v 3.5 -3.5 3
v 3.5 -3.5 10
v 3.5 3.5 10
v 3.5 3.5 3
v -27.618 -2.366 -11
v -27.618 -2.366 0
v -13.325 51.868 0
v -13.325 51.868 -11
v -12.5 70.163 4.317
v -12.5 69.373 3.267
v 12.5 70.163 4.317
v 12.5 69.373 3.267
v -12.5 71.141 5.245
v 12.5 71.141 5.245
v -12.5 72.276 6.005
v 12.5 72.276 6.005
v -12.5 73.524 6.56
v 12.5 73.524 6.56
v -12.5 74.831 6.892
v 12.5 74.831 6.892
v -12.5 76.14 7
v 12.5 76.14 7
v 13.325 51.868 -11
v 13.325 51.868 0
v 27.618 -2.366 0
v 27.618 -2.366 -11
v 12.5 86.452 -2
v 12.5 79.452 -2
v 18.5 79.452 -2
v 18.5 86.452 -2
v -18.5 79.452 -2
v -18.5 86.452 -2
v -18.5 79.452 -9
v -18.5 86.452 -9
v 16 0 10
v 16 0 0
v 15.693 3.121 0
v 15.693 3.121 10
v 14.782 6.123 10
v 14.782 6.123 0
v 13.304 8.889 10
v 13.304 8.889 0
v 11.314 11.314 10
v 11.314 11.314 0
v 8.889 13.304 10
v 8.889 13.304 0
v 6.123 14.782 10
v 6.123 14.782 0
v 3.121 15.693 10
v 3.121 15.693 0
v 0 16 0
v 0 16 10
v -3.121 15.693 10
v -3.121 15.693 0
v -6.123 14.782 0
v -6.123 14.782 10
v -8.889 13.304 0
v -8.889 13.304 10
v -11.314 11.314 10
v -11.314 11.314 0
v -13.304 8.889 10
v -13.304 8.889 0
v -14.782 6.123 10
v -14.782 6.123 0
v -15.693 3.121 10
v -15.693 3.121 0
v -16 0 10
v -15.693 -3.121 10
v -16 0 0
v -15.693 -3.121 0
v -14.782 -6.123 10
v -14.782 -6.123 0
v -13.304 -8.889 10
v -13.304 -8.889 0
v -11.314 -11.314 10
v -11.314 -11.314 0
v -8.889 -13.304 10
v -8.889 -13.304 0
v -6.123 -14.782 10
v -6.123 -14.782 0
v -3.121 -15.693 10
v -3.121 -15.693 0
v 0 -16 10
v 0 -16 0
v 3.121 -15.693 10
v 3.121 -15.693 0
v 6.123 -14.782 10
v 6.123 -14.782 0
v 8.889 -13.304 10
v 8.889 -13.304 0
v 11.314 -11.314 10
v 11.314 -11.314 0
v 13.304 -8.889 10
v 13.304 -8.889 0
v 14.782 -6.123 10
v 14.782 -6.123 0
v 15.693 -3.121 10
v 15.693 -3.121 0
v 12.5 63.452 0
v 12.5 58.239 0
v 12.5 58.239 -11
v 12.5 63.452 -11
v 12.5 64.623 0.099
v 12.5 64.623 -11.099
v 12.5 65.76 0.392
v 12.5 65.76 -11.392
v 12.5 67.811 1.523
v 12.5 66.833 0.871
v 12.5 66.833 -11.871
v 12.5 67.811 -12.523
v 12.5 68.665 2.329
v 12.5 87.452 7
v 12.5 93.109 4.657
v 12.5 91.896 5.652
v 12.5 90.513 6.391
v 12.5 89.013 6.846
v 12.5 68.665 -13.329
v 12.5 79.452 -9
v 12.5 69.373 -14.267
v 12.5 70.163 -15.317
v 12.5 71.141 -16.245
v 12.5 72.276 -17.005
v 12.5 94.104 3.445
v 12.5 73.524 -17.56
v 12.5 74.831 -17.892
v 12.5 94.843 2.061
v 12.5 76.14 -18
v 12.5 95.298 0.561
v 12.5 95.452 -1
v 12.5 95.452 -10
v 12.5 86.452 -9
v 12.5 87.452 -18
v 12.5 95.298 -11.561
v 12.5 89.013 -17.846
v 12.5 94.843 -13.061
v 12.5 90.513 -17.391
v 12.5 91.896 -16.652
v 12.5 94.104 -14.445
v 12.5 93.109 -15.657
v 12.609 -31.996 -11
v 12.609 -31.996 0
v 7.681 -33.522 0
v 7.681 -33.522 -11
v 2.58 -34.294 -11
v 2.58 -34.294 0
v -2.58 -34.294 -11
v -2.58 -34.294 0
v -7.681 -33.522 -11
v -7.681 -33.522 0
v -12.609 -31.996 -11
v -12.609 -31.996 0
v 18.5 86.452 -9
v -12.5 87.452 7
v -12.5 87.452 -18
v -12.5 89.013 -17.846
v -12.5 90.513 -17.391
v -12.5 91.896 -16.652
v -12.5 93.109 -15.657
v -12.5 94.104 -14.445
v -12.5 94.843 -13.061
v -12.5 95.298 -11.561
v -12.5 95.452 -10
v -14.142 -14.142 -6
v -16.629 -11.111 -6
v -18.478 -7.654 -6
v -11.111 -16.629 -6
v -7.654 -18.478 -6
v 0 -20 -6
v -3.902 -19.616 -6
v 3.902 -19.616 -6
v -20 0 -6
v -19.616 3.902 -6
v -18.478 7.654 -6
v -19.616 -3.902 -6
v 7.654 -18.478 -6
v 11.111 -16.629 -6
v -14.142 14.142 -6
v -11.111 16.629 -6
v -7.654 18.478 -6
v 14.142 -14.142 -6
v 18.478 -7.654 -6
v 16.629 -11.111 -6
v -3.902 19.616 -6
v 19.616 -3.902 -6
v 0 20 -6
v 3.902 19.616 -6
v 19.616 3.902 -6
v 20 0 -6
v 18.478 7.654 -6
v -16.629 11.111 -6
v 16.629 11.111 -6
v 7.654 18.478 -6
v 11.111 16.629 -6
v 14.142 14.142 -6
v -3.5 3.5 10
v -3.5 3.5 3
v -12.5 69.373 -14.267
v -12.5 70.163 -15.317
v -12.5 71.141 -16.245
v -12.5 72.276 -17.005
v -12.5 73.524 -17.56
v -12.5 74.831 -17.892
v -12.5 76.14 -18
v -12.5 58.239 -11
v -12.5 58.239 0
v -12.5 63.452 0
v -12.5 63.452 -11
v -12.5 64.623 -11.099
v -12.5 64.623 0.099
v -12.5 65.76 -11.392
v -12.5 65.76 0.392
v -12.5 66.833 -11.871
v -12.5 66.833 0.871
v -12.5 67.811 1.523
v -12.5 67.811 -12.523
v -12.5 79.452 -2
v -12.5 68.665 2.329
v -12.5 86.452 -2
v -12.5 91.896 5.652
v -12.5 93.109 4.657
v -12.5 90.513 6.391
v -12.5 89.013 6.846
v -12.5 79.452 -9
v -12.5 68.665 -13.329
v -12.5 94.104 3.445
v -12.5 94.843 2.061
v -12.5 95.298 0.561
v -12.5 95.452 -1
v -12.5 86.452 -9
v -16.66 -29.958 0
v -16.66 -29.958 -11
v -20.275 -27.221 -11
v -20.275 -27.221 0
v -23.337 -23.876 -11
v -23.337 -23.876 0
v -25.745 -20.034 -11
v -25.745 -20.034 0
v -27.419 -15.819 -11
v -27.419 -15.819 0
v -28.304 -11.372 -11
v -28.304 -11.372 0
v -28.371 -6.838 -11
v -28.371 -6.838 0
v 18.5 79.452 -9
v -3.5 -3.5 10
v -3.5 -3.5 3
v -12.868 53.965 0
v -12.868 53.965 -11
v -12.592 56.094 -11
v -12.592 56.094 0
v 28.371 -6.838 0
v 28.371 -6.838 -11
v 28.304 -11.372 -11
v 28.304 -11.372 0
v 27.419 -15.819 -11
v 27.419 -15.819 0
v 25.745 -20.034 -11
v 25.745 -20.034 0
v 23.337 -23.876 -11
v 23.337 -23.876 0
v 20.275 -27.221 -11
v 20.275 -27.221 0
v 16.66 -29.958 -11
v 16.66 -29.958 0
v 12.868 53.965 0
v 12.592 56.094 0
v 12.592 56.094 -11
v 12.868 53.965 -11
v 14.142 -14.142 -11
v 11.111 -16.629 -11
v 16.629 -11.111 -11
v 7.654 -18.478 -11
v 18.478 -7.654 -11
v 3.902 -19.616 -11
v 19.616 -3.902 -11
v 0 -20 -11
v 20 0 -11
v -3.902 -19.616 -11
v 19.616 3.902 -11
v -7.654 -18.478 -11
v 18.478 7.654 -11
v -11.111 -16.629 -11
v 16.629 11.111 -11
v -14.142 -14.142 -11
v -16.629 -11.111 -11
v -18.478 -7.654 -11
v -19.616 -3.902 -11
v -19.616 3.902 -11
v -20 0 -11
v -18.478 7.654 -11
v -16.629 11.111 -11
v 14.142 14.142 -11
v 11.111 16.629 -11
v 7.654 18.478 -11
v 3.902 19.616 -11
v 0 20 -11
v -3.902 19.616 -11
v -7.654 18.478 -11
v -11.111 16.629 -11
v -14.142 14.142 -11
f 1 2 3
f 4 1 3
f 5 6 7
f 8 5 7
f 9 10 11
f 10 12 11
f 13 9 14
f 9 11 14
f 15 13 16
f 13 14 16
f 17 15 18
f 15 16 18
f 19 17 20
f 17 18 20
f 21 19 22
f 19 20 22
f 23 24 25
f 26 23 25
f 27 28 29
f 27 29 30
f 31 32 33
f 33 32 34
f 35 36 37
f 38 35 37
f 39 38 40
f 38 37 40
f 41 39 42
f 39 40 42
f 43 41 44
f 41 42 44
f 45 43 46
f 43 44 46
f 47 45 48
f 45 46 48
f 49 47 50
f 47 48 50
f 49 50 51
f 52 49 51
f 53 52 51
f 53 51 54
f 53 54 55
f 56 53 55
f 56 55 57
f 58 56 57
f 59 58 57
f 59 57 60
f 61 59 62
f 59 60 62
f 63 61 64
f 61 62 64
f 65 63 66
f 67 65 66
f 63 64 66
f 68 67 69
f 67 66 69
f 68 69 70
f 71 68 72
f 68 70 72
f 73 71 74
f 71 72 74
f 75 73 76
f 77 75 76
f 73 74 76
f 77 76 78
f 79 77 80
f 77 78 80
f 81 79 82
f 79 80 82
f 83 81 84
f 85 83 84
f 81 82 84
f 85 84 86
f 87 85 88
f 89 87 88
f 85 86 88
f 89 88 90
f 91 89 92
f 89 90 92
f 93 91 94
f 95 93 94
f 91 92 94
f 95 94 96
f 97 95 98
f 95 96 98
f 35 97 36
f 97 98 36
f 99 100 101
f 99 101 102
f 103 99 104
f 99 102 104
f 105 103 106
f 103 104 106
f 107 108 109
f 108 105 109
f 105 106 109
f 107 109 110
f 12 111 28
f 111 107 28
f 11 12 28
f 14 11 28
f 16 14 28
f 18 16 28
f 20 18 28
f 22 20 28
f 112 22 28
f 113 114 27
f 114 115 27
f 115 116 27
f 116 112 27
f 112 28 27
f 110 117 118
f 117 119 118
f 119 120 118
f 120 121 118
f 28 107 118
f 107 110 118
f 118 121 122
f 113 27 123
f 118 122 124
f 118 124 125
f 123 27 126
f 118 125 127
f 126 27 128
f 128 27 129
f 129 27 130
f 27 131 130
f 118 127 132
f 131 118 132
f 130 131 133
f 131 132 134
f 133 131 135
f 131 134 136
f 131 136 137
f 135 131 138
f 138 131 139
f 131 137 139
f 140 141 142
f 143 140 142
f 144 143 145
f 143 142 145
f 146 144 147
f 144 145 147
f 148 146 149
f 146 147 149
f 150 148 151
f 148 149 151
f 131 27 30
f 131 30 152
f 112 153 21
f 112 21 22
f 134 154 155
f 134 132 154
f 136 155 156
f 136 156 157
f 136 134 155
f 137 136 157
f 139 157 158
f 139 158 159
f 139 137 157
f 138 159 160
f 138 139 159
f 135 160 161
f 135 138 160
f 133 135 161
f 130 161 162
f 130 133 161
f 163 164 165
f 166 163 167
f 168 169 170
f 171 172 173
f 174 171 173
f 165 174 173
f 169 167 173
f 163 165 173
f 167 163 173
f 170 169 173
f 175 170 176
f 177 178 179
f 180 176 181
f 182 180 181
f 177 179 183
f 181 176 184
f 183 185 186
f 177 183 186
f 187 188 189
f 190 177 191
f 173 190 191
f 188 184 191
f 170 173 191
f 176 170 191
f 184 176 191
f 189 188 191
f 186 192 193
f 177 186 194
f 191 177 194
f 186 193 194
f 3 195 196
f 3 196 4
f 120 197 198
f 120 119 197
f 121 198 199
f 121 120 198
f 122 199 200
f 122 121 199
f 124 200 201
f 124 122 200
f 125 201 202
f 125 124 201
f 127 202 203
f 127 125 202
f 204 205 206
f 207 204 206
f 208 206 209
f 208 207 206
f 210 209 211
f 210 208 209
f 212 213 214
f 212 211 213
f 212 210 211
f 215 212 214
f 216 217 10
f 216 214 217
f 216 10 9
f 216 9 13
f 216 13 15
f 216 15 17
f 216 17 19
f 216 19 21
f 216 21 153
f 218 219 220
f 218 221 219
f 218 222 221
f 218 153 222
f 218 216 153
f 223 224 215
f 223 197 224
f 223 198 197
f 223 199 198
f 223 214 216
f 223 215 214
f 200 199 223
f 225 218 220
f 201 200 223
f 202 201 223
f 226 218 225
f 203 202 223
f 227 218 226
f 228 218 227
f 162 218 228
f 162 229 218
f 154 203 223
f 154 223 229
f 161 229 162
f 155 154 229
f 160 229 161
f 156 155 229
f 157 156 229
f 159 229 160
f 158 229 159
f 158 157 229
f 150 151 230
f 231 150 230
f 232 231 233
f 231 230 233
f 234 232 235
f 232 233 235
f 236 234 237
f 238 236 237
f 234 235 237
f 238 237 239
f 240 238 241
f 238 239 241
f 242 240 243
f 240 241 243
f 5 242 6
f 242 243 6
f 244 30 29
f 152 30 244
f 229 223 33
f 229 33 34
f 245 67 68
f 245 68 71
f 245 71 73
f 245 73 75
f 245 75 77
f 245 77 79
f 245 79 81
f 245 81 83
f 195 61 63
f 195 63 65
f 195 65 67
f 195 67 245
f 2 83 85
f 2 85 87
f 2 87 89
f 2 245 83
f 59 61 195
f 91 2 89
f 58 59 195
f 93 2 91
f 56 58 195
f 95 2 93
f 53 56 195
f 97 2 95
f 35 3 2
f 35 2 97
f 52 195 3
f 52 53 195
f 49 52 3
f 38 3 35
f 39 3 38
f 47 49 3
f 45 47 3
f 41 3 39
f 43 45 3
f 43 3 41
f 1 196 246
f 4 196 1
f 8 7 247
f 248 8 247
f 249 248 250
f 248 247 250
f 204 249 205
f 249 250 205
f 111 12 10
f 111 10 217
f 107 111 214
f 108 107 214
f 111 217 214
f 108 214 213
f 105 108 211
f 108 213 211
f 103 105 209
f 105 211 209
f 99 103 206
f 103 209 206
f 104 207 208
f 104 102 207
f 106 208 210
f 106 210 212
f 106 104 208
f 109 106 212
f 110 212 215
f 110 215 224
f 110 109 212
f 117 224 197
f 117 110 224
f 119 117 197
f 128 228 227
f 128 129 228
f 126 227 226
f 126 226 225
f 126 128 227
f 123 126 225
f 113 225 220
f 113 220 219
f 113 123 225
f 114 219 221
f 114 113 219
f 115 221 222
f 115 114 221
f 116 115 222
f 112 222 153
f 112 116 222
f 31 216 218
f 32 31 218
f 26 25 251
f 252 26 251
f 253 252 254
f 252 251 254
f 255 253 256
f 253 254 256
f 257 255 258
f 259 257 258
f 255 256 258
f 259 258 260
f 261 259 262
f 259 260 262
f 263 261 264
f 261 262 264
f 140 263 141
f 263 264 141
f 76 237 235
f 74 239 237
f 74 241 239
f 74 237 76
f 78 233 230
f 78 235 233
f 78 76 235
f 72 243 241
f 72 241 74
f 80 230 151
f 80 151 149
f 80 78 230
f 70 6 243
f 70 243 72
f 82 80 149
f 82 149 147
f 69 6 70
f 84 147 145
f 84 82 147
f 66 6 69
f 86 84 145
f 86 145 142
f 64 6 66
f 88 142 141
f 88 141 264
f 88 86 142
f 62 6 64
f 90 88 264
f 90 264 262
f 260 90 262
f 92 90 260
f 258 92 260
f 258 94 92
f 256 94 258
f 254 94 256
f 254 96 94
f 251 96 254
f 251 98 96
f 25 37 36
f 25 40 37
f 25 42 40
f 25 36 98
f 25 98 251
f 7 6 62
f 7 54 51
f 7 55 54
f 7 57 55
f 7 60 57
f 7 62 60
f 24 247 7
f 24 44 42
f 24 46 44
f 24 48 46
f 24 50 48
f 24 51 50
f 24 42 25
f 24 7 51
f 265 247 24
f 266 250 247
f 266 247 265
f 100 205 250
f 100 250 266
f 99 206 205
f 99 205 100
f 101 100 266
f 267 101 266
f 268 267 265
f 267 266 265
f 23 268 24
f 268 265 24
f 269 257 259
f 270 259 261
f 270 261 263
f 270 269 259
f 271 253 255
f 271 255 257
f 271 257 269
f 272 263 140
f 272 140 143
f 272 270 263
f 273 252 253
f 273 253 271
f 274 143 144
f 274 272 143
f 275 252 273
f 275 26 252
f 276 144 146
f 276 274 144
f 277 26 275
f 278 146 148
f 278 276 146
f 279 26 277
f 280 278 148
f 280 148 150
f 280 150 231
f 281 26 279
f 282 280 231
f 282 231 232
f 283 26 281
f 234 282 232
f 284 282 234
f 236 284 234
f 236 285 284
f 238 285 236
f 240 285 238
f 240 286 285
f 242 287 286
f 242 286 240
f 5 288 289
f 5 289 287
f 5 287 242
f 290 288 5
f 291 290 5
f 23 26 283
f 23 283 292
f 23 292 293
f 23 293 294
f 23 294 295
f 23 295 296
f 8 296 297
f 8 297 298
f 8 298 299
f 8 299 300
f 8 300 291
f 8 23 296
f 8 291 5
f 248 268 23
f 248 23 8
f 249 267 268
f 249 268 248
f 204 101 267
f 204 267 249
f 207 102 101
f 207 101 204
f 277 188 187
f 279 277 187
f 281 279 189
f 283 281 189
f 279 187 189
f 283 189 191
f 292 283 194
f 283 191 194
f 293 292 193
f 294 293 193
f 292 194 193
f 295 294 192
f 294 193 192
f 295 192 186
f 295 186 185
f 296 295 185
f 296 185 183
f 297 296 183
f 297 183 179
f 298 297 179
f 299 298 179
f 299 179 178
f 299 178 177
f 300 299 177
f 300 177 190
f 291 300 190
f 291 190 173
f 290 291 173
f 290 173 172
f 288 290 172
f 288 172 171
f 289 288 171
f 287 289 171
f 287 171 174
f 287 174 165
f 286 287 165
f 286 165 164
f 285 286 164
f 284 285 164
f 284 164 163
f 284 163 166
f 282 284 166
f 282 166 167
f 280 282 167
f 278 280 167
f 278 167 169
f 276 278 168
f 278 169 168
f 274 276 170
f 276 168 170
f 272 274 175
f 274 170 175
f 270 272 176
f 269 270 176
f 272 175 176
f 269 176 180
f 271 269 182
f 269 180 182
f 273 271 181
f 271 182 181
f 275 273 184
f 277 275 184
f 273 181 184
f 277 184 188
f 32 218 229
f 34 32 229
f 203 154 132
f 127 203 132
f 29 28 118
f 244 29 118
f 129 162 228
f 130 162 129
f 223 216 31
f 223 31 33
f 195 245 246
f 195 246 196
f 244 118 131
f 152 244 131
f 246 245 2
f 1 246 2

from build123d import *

# Parameters (mm, degrees)
SKETCH1_R                = 20
SKETCH1_R_2              = 4
BOSS_EXTRUDE1_DEPTH      = 11
SKETCH1_4_R              = 20
BOSS_EXTRUDE2_DEPTH      = 6
SKETCH3_R                = 16
BOSS_EXTRUDE3_DEPTH      = 10
SKETCH4_W                = 7
SKETCH4_H                = 7
CUT_EXTRUDE1_DEPTH       = 7
BOSS_EXTRUDE4_DEPTH      = 7
BOSS_EXTRUDE4_DEPTH_BACK = 18
SKETCH5_W                = 25
SKETCH5_H                = 25
SKETCH6_W                = 7
SKETCH6_H                = 7
BOSS_EXTRUDE5_DEPTH      = 6
CUT_EXTRUDE2_DEPTH       = 11
FILLET1_R                = 7
FILLET2_R                = 7
FILLET3_R                = 8


with BuildPart() as part:
    # Sketch1 → Boss-Extrude1 (new body)
    with BuildSketch(Plane.XY):
        with BuildLine():
            Line((-27.617597302, -2.366025969), (-13.325344527, 51.86810446))
            ThreePointArc((-13.325344527, 51.86810446), (-12.707194725, 55.026842667), (-12.5, 58.238821277))
            Line((-12.5, 58.238821277), (-12.5, 67.307346))
            Line((-12.5, 67.307346), (-12.5, 95.903667694))
            ThreePointArc((-12.5, 95.903667694), (0, 100.951833847), (12.5, 95.903667694))
            Line((12.5, 95.903667694), (12.5, 67.307346))
            Line((12.5, 67.307346), (12.5, 58.238821277))
            ThreePointArc((12.5, 58.238821277), (12.707194725, 55.026842667), (13.325344527, 51.86810446))
            Line((13.325344527, 51.86810446), (27.617597302, -2.366025969))
            ThreePointArc((27.617597302, -2.366025969), (25.744947954, -20.033668156), (12.608807935, -31.995867846))
            ThreePointArc((12.608807935, -31.995867846), (0, -34.390661476), (-12.608807935, -31.995867846))
            ThreePointArc((-12.608807935, -31.995867846), (-25.744947954, -20.033668156), (-27.617597302, -2.366025969))
        make_face()
        Circle(SKETCH1_R, mode=Mode.SUBTRACT)
        with Locations((0, 82.951833847)):
            Circle(SKETCH1_R_2, mode=Mode.SUBTRACT)
    extrude(amount=-BOSS_EXTRUDE1_DEPTH)

    # Sketch1<4> → Boss-Extrude2 (add)
    with BuildSketch(Plane.XY):
        Circle(SKETCH1_4_R)
    extrude(amount=-BOSS_EXTRUDE2_DEPTH)

    # Sketch3 → Boss-Extrude3 (add)
    with BuildSketch(Plane.XY):
        Circle(SKETCH3_R)
    extrude(amount=BOSS_EXTRUDE3_DEPTH)

    # Sketch4 → Cut-Extrude1 (cut)
    with BuildSketch(Plane.XY.offset(10)):
        Rectangle(SKETCH4_W, SKETCH4_H)
    extrude(amount=-CUT_EXTRUDE1_DEPTH, mode=Mode.SUBTRACT)

    # Sketch5 → Boss-Extrude4 (add, two sides: drawn at the far end of the back side and taken through both)
    with BuildSketch(Plane.XY.offset(-BOSS_EXTRUDE4_DEPTH_BACK)):
        with Locations((0, 82.951833847)):
            Rectangle(SKETCH5_W, SKETCH5_H)
    extrude(amount=BOSS_EXTRUDE4_DEPTH + BOSS_EXTRUDE4_DEPTH_BACK)

    # Sketch6 → Boss-Extrude5 (add)
    with BuildSketch(Plane(origin=(12.5, 0, 0), x_dir=(0, 0, -1), z_dir=(1, 0, 0))):
        with Locations((5.5, 82.951833847)):
            Rectangle(SKETCH6_W, SKETCH6_H)
    boss_extrude5 = extrude(amount=BOSS_EXTRUDE5_DEPTH)

    # Mirror1: Boss-Extrude5 across plane
    add(boss_extrude5.mirror(Plane(origin=(0, 0, 0), x_dir=(0, 0, 1), z_dir=(1, 0, 0))))

    # Sketch7 → Cut-Extrude2 (cut)
    with BuildSketch(Plane.XY):
        with BuildLine():
            Line((-12.5, 95.451833847), (12.5, 95.451833847))
            Line((12.5, 95.451833847), (12.5, 95.903667694))
            ThreePointArc((12.5, 95.903667694), (0, 100.951833847), (-12.5, 95.903667694))
            Line((-12.5, 95.903667694), (-12.5, 95.451833847))
        make_face()
    extrude(amount=-CUT_EXTRUDE2_DEPTH, mode=Mode.SUBTRACT)

    # Fillet1
    fillet1_edges = [part.edges().sort_by_distance(p)[0] for p in [
        (0, 70.451833847, 0),
    ]]
    fillet(fillet1_edges, radius=FILLET1_R - 0.0001)  # a hair under: the kernel refuses the full size

    # Fillet2
    fillet2_edges = [part.edges().sort_by_distance(p)[0] for p in [
        (0, 70.451833847, -11),
    ]]
    fillet(fillet2_edges, radius=FILLET2_R - 0.0001)  # a hair under: the kernel refuses the full size

    # Fillet3
    fillet3_edges = [part.edges().sort_by_distance(p)[0] for p in [
        (0, 70.451833847, -18),
        (0, 95.451833847, -18),
        (0, 95.451833847, 7),
        (0, 70.451833847, 7),
    ]]
    fillet(fillet3_edges, radius=FILLET3_R)


solid = part.part
